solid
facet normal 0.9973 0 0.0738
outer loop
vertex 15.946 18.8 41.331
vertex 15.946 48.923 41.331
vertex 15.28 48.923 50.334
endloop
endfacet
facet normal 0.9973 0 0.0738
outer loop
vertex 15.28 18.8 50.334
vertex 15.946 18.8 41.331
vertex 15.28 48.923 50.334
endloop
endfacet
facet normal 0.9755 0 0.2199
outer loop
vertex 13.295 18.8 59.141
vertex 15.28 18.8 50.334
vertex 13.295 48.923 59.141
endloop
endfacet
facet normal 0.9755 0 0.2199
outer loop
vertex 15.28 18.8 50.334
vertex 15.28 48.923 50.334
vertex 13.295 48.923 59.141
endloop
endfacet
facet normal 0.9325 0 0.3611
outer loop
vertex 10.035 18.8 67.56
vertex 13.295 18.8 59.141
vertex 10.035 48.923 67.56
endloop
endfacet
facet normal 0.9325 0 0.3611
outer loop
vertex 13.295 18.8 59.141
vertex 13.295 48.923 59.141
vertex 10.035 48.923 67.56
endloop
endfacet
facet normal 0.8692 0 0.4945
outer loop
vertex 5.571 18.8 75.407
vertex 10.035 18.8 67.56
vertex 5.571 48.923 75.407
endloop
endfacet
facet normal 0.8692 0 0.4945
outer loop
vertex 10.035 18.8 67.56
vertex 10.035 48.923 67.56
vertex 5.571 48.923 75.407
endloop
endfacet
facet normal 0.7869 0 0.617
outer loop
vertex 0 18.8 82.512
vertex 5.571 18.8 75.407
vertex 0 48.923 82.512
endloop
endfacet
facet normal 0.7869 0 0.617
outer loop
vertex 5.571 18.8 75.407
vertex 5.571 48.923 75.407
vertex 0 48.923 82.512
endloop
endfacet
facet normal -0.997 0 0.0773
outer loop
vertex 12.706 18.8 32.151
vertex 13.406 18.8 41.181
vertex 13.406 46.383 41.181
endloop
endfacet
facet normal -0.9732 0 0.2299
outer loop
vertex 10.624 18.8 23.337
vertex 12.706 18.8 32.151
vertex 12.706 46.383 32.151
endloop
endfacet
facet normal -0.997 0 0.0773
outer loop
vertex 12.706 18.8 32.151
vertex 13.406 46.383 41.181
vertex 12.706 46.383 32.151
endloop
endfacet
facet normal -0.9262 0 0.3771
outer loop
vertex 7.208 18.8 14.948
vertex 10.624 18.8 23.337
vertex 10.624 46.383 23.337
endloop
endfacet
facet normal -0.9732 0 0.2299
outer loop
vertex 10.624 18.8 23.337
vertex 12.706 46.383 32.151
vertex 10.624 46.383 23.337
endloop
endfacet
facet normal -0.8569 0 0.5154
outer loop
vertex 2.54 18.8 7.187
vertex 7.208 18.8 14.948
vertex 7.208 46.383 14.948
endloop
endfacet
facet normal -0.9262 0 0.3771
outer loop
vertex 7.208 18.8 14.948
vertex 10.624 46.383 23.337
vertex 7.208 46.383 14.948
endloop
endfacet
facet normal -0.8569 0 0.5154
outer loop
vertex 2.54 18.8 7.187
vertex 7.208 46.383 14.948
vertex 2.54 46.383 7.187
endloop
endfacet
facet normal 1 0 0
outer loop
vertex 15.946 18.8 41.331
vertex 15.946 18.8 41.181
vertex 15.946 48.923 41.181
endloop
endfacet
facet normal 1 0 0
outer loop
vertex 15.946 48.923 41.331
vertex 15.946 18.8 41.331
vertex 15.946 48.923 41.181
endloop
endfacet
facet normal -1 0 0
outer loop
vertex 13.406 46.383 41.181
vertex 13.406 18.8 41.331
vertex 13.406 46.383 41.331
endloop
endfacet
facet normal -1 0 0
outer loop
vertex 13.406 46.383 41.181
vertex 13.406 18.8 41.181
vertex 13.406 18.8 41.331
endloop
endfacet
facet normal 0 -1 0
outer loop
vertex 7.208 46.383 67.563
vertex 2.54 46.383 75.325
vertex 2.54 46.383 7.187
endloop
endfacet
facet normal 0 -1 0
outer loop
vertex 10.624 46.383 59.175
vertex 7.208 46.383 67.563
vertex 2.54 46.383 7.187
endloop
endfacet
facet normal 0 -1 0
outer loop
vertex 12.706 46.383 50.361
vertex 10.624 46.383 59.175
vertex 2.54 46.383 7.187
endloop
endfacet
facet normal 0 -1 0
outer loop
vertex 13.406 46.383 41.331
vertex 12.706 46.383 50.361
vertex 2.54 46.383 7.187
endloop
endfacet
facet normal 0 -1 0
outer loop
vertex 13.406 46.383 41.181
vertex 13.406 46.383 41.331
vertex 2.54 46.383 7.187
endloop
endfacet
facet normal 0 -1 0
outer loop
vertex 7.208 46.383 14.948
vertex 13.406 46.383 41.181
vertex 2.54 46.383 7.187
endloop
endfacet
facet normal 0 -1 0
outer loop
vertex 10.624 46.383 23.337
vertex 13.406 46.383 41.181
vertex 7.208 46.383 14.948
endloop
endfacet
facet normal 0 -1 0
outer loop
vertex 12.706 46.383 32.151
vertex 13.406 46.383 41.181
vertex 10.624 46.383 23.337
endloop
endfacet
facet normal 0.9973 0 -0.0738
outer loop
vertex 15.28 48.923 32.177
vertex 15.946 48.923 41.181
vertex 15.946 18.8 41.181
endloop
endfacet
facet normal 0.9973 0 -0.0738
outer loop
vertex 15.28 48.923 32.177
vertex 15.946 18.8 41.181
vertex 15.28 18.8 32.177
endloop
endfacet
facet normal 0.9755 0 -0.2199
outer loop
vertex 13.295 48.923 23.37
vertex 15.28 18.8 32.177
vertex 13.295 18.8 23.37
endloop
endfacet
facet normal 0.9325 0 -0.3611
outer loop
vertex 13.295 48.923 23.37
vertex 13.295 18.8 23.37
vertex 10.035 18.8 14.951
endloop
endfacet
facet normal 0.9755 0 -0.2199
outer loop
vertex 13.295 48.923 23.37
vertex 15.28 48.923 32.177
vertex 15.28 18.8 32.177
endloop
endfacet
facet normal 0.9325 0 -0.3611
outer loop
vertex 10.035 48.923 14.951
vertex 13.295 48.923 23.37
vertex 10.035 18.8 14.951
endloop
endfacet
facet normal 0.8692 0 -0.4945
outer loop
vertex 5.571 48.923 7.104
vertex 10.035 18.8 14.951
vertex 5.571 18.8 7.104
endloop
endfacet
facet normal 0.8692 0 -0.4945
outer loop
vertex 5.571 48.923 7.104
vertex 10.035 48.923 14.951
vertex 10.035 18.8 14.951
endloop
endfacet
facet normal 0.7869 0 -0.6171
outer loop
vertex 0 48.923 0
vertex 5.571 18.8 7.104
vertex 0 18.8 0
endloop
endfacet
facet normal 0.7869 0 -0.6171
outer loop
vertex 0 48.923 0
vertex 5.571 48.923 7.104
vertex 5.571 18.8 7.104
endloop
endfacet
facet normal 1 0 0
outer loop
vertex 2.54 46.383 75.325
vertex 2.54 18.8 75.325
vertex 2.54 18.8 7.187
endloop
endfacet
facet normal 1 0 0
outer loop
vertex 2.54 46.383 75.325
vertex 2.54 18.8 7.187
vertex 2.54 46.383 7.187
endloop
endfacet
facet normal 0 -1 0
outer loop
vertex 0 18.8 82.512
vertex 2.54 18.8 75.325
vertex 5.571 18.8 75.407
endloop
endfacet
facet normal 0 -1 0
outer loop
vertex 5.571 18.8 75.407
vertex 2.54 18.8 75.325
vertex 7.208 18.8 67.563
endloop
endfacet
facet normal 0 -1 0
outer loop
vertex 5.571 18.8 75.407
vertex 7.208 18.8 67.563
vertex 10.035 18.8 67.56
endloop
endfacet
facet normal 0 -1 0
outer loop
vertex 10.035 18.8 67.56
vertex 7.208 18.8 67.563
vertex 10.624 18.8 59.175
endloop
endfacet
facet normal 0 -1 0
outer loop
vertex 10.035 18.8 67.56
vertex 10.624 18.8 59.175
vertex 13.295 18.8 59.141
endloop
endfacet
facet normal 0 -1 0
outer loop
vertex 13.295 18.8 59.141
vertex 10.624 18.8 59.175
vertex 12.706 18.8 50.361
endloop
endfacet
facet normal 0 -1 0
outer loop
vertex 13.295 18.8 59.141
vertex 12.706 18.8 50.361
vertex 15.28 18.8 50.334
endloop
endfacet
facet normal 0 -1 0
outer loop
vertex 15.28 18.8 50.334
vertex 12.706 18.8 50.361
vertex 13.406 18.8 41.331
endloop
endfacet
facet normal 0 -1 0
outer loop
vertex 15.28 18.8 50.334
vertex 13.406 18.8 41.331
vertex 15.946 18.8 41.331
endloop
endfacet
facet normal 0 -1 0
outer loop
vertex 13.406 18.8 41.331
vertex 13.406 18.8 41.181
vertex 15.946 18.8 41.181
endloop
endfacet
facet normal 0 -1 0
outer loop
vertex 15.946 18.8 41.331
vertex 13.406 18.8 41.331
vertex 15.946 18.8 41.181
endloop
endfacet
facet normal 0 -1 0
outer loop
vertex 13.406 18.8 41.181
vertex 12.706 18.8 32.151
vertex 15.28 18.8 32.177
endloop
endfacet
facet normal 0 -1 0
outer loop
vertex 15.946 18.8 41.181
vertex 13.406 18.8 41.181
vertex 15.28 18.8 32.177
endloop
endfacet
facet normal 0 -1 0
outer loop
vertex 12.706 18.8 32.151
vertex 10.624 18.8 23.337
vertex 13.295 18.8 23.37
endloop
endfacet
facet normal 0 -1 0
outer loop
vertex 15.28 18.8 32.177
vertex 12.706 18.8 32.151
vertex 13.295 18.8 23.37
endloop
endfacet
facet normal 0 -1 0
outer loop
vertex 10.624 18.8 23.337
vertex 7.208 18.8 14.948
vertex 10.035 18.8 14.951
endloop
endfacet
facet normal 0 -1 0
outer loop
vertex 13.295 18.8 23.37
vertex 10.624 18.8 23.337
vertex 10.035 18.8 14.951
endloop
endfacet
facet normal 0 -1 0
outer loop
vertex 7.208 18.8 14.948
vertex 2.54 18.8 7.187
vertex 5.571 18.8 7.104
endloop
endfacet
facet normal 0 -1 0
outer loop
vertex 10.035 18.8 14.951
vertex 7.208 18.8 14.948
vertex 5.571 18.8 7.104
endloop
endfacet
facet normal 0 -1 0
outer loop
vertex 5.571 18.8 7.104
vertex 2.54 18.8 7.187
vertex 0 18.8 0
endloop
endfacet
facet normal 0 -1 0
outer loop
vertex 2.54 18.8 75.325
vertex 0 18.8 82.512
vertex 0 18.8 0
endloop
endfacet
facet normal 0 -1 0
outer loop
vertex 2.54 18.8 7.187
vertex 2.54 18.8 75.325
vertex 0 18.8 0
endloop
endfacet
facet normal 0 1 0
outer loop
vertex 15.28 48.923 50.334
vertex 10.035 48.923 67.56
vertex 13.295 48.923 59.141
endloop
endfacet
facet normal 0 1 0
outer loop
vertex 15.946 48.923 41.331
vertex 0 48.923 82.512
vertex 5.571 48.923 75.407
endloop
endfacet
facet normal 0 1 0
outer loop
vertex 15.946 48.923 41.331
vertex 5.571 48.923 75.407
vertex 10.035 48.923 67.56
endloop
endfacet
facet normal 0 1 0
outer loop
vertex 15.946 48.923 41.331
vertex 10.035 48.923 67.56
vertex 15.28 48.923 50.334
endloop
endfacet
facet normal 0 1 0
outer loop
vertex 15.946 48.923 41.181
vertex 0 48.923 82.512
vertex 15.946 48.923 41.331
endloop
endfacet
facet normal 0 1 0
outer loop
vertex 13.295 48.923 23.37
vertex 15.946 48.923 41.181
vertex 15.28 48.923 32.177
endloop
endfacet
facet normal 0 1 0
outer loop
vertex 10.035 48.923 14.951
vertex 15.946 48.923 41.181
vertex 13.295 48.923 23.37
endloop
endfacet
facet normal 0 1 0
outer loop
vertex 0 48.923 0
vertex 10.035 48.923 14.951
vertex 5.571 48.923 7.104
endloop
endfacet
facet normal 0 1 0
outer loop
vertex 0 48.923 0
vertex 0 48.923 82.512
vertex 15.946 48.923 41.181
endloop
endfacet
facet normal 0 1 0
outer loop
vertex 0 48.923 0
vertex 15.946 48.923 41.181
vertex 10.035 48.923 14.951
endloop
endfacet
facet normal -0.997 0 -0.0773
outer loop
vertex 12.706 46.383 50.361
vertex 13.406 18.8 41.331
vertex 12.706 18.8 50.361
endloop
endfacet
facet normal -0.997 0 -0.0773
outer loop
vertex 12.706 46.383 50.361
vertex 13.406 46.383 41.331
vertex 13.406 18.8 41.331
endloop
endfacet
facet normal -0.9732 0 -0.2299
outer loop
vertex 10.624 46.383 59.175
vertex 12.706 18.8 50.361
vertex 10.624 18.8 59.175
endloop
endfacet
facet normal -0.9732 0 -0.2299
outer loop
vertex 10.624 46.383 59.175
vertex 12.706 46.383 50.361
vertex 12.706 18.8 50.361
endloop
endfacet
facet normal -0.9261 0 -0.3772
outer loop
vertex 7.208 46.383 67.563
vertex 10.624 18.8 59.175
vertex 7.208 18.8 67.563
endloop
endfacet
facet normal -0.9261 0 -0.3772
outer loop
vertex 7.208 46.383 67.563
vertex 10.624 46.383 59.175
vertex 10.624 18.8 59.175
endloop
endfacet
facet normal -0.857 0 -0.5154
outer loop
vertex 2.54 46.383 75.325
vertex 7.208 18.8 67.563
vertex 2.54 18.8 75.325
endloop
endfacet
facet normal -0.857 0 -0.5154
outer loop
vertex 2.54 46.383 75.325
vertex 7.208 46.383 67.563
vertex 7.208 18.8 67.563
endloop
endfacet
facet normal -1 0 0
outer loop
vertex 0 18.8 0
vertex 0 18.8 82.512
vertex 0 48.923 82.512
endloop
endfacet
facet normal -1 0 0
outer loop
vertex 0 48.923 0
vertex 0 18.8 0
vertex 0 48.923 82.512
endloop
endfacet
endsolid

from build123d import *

# Parameters (mm, degrees)
F0_W        = 15.9461647272
F0_H        = 30.12368083
F1_DEPTH    = 82.5116038322
F2_T1_DEPTH = 236.0281493159
F3_T        = -2.54


# Not quite as in the source:
# - a fillet or chamfer that OpenCascade refuses, or shapes differently, is made with other operations: its cross-section is extruded or revolved along the edge and cut away or added


with BuildPart() as f1:
    # F0 (on Top) → F1 (new body)
    with BuildSketch(Plane.XY):
        with Locations((7.9730823636, 33.8614284992)):
            Rectangle(F0_W, F0_H)
    extrude(amount=F1_DEPTH)

    # F2: fillet of radius 61.1478122974 on 2 edges, made by hand

    # F2_s2 → F2_t1 (cut)
    with BuildSketch(Plane.XZ.offset(-151.8755031572)):
        with BuildLine():
            ThreePointArc((15.9461647272, 41.3307101351), (11.8204394221, 63.4109398395), (0, 82.5116038322))
            Line((0, 82.5116038322), (0.9040329514, 83.3352217062))
            ThreePointArc((0.9040329514, 83.3352217062), (7.9730823636, 83.7345600782), (15.9461647272, 83.7345600782))
            Line((15.9461647272, 83.7345600782), (17.1691209732, 82.5116038322))
            Line((17.1691209732, 82.5116038322), (17.1691209732, 41.3307101351))
            Line((17.1691209732, 41.3307101351), (15.9461647272, 41.3307101351))
        make_face()
        with BuildLine():
            ThreePointArc((15.9461647272, 41.1808936972), (11.8204394221, 19.1006639927), (0, 0))
            Line((0, 0), (0.9040329514, -0.8236178739))
            ThreePointArc((0.9040329514, -0.8236178739), (7.9730823636, -1.2229562459), (15.9461647272, -1.2229562459))
            Line((15.9461647272, -1.2229562459), (17.1691209732, 0))
            Line((17.1691209732, 0), (17.1691209732, 41.1808936972))
            Line((17.1691209732, 41.1808936972), (15.9461647272, 41.1808936972))
        make_face()
    extrude(amount=F2_T1_DEPTH, mode=Mode.SUBTRACT)

    # F3
    f3_openings = [f1.faces().sort_by_distance(p)[0] for p in [
        (6.459613, 18.799588, 41.255802),
    ]]
    offset(amount=F3_T, openings=f3_openings)


solid = f1.part
